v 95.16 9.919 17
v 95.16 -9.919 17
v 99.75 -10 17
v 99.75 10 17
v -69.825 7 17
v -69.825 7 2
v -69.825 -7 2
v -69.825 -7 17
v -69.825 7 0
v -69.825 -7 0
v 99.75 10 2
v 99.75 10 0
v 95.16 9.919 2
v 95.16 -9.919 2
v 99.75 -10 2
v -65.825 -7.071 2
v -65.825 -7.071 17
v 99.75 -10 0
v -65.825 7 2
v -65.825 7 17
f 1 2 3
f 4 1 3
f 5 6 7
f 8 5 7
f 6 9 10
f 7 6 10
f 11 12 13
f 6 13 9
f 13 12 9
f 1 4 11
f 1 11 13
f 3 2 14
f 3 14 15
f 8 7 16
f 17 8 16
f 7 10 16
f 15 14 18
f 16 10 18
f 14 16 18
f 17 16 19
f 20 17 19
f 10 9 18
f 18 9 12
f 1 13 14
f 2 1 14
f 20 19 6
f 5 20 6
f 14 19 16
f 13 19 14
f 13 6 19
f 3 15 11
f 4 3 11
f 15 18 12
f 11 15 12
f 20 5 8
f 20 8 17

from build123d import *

# Parameters (mm, degrees)
EXTRUDE_1_DEPTH = 2
EXTRUDE_2_DEPTH = 15


with BuildPart() as part:
    # 스케치1 → 보스-돌출1 (new body)
    with BuildSketch(Plane.XY):
        Polygon((-69.825, -7), (99.75, -10), (99.75, 10), (-69.825, 7), align=None)
    extrude(amount=EXTRUDE_1_DEPTH)

    # 스케치2 → 보스-돌출2 (add)
    with BuildSketch(Plane.XY.offset(2)):
        Polygon((-65.825, 7), (-69.825, 7), (-69.825, -7), (-65.825, -7.070765148), align=None)
        Polygon((99.75, 10), (95.16, 9.918796992), (95.16, -9.918796992), (99.75, -9.918796992), align=None)
        Polygon((99.75, -9.918796992), (95.16, -9.918796992), (99.75, -10), align=None)
    extrude(amount=EXTRUDE_2_DEPTH)


solid = part.part
